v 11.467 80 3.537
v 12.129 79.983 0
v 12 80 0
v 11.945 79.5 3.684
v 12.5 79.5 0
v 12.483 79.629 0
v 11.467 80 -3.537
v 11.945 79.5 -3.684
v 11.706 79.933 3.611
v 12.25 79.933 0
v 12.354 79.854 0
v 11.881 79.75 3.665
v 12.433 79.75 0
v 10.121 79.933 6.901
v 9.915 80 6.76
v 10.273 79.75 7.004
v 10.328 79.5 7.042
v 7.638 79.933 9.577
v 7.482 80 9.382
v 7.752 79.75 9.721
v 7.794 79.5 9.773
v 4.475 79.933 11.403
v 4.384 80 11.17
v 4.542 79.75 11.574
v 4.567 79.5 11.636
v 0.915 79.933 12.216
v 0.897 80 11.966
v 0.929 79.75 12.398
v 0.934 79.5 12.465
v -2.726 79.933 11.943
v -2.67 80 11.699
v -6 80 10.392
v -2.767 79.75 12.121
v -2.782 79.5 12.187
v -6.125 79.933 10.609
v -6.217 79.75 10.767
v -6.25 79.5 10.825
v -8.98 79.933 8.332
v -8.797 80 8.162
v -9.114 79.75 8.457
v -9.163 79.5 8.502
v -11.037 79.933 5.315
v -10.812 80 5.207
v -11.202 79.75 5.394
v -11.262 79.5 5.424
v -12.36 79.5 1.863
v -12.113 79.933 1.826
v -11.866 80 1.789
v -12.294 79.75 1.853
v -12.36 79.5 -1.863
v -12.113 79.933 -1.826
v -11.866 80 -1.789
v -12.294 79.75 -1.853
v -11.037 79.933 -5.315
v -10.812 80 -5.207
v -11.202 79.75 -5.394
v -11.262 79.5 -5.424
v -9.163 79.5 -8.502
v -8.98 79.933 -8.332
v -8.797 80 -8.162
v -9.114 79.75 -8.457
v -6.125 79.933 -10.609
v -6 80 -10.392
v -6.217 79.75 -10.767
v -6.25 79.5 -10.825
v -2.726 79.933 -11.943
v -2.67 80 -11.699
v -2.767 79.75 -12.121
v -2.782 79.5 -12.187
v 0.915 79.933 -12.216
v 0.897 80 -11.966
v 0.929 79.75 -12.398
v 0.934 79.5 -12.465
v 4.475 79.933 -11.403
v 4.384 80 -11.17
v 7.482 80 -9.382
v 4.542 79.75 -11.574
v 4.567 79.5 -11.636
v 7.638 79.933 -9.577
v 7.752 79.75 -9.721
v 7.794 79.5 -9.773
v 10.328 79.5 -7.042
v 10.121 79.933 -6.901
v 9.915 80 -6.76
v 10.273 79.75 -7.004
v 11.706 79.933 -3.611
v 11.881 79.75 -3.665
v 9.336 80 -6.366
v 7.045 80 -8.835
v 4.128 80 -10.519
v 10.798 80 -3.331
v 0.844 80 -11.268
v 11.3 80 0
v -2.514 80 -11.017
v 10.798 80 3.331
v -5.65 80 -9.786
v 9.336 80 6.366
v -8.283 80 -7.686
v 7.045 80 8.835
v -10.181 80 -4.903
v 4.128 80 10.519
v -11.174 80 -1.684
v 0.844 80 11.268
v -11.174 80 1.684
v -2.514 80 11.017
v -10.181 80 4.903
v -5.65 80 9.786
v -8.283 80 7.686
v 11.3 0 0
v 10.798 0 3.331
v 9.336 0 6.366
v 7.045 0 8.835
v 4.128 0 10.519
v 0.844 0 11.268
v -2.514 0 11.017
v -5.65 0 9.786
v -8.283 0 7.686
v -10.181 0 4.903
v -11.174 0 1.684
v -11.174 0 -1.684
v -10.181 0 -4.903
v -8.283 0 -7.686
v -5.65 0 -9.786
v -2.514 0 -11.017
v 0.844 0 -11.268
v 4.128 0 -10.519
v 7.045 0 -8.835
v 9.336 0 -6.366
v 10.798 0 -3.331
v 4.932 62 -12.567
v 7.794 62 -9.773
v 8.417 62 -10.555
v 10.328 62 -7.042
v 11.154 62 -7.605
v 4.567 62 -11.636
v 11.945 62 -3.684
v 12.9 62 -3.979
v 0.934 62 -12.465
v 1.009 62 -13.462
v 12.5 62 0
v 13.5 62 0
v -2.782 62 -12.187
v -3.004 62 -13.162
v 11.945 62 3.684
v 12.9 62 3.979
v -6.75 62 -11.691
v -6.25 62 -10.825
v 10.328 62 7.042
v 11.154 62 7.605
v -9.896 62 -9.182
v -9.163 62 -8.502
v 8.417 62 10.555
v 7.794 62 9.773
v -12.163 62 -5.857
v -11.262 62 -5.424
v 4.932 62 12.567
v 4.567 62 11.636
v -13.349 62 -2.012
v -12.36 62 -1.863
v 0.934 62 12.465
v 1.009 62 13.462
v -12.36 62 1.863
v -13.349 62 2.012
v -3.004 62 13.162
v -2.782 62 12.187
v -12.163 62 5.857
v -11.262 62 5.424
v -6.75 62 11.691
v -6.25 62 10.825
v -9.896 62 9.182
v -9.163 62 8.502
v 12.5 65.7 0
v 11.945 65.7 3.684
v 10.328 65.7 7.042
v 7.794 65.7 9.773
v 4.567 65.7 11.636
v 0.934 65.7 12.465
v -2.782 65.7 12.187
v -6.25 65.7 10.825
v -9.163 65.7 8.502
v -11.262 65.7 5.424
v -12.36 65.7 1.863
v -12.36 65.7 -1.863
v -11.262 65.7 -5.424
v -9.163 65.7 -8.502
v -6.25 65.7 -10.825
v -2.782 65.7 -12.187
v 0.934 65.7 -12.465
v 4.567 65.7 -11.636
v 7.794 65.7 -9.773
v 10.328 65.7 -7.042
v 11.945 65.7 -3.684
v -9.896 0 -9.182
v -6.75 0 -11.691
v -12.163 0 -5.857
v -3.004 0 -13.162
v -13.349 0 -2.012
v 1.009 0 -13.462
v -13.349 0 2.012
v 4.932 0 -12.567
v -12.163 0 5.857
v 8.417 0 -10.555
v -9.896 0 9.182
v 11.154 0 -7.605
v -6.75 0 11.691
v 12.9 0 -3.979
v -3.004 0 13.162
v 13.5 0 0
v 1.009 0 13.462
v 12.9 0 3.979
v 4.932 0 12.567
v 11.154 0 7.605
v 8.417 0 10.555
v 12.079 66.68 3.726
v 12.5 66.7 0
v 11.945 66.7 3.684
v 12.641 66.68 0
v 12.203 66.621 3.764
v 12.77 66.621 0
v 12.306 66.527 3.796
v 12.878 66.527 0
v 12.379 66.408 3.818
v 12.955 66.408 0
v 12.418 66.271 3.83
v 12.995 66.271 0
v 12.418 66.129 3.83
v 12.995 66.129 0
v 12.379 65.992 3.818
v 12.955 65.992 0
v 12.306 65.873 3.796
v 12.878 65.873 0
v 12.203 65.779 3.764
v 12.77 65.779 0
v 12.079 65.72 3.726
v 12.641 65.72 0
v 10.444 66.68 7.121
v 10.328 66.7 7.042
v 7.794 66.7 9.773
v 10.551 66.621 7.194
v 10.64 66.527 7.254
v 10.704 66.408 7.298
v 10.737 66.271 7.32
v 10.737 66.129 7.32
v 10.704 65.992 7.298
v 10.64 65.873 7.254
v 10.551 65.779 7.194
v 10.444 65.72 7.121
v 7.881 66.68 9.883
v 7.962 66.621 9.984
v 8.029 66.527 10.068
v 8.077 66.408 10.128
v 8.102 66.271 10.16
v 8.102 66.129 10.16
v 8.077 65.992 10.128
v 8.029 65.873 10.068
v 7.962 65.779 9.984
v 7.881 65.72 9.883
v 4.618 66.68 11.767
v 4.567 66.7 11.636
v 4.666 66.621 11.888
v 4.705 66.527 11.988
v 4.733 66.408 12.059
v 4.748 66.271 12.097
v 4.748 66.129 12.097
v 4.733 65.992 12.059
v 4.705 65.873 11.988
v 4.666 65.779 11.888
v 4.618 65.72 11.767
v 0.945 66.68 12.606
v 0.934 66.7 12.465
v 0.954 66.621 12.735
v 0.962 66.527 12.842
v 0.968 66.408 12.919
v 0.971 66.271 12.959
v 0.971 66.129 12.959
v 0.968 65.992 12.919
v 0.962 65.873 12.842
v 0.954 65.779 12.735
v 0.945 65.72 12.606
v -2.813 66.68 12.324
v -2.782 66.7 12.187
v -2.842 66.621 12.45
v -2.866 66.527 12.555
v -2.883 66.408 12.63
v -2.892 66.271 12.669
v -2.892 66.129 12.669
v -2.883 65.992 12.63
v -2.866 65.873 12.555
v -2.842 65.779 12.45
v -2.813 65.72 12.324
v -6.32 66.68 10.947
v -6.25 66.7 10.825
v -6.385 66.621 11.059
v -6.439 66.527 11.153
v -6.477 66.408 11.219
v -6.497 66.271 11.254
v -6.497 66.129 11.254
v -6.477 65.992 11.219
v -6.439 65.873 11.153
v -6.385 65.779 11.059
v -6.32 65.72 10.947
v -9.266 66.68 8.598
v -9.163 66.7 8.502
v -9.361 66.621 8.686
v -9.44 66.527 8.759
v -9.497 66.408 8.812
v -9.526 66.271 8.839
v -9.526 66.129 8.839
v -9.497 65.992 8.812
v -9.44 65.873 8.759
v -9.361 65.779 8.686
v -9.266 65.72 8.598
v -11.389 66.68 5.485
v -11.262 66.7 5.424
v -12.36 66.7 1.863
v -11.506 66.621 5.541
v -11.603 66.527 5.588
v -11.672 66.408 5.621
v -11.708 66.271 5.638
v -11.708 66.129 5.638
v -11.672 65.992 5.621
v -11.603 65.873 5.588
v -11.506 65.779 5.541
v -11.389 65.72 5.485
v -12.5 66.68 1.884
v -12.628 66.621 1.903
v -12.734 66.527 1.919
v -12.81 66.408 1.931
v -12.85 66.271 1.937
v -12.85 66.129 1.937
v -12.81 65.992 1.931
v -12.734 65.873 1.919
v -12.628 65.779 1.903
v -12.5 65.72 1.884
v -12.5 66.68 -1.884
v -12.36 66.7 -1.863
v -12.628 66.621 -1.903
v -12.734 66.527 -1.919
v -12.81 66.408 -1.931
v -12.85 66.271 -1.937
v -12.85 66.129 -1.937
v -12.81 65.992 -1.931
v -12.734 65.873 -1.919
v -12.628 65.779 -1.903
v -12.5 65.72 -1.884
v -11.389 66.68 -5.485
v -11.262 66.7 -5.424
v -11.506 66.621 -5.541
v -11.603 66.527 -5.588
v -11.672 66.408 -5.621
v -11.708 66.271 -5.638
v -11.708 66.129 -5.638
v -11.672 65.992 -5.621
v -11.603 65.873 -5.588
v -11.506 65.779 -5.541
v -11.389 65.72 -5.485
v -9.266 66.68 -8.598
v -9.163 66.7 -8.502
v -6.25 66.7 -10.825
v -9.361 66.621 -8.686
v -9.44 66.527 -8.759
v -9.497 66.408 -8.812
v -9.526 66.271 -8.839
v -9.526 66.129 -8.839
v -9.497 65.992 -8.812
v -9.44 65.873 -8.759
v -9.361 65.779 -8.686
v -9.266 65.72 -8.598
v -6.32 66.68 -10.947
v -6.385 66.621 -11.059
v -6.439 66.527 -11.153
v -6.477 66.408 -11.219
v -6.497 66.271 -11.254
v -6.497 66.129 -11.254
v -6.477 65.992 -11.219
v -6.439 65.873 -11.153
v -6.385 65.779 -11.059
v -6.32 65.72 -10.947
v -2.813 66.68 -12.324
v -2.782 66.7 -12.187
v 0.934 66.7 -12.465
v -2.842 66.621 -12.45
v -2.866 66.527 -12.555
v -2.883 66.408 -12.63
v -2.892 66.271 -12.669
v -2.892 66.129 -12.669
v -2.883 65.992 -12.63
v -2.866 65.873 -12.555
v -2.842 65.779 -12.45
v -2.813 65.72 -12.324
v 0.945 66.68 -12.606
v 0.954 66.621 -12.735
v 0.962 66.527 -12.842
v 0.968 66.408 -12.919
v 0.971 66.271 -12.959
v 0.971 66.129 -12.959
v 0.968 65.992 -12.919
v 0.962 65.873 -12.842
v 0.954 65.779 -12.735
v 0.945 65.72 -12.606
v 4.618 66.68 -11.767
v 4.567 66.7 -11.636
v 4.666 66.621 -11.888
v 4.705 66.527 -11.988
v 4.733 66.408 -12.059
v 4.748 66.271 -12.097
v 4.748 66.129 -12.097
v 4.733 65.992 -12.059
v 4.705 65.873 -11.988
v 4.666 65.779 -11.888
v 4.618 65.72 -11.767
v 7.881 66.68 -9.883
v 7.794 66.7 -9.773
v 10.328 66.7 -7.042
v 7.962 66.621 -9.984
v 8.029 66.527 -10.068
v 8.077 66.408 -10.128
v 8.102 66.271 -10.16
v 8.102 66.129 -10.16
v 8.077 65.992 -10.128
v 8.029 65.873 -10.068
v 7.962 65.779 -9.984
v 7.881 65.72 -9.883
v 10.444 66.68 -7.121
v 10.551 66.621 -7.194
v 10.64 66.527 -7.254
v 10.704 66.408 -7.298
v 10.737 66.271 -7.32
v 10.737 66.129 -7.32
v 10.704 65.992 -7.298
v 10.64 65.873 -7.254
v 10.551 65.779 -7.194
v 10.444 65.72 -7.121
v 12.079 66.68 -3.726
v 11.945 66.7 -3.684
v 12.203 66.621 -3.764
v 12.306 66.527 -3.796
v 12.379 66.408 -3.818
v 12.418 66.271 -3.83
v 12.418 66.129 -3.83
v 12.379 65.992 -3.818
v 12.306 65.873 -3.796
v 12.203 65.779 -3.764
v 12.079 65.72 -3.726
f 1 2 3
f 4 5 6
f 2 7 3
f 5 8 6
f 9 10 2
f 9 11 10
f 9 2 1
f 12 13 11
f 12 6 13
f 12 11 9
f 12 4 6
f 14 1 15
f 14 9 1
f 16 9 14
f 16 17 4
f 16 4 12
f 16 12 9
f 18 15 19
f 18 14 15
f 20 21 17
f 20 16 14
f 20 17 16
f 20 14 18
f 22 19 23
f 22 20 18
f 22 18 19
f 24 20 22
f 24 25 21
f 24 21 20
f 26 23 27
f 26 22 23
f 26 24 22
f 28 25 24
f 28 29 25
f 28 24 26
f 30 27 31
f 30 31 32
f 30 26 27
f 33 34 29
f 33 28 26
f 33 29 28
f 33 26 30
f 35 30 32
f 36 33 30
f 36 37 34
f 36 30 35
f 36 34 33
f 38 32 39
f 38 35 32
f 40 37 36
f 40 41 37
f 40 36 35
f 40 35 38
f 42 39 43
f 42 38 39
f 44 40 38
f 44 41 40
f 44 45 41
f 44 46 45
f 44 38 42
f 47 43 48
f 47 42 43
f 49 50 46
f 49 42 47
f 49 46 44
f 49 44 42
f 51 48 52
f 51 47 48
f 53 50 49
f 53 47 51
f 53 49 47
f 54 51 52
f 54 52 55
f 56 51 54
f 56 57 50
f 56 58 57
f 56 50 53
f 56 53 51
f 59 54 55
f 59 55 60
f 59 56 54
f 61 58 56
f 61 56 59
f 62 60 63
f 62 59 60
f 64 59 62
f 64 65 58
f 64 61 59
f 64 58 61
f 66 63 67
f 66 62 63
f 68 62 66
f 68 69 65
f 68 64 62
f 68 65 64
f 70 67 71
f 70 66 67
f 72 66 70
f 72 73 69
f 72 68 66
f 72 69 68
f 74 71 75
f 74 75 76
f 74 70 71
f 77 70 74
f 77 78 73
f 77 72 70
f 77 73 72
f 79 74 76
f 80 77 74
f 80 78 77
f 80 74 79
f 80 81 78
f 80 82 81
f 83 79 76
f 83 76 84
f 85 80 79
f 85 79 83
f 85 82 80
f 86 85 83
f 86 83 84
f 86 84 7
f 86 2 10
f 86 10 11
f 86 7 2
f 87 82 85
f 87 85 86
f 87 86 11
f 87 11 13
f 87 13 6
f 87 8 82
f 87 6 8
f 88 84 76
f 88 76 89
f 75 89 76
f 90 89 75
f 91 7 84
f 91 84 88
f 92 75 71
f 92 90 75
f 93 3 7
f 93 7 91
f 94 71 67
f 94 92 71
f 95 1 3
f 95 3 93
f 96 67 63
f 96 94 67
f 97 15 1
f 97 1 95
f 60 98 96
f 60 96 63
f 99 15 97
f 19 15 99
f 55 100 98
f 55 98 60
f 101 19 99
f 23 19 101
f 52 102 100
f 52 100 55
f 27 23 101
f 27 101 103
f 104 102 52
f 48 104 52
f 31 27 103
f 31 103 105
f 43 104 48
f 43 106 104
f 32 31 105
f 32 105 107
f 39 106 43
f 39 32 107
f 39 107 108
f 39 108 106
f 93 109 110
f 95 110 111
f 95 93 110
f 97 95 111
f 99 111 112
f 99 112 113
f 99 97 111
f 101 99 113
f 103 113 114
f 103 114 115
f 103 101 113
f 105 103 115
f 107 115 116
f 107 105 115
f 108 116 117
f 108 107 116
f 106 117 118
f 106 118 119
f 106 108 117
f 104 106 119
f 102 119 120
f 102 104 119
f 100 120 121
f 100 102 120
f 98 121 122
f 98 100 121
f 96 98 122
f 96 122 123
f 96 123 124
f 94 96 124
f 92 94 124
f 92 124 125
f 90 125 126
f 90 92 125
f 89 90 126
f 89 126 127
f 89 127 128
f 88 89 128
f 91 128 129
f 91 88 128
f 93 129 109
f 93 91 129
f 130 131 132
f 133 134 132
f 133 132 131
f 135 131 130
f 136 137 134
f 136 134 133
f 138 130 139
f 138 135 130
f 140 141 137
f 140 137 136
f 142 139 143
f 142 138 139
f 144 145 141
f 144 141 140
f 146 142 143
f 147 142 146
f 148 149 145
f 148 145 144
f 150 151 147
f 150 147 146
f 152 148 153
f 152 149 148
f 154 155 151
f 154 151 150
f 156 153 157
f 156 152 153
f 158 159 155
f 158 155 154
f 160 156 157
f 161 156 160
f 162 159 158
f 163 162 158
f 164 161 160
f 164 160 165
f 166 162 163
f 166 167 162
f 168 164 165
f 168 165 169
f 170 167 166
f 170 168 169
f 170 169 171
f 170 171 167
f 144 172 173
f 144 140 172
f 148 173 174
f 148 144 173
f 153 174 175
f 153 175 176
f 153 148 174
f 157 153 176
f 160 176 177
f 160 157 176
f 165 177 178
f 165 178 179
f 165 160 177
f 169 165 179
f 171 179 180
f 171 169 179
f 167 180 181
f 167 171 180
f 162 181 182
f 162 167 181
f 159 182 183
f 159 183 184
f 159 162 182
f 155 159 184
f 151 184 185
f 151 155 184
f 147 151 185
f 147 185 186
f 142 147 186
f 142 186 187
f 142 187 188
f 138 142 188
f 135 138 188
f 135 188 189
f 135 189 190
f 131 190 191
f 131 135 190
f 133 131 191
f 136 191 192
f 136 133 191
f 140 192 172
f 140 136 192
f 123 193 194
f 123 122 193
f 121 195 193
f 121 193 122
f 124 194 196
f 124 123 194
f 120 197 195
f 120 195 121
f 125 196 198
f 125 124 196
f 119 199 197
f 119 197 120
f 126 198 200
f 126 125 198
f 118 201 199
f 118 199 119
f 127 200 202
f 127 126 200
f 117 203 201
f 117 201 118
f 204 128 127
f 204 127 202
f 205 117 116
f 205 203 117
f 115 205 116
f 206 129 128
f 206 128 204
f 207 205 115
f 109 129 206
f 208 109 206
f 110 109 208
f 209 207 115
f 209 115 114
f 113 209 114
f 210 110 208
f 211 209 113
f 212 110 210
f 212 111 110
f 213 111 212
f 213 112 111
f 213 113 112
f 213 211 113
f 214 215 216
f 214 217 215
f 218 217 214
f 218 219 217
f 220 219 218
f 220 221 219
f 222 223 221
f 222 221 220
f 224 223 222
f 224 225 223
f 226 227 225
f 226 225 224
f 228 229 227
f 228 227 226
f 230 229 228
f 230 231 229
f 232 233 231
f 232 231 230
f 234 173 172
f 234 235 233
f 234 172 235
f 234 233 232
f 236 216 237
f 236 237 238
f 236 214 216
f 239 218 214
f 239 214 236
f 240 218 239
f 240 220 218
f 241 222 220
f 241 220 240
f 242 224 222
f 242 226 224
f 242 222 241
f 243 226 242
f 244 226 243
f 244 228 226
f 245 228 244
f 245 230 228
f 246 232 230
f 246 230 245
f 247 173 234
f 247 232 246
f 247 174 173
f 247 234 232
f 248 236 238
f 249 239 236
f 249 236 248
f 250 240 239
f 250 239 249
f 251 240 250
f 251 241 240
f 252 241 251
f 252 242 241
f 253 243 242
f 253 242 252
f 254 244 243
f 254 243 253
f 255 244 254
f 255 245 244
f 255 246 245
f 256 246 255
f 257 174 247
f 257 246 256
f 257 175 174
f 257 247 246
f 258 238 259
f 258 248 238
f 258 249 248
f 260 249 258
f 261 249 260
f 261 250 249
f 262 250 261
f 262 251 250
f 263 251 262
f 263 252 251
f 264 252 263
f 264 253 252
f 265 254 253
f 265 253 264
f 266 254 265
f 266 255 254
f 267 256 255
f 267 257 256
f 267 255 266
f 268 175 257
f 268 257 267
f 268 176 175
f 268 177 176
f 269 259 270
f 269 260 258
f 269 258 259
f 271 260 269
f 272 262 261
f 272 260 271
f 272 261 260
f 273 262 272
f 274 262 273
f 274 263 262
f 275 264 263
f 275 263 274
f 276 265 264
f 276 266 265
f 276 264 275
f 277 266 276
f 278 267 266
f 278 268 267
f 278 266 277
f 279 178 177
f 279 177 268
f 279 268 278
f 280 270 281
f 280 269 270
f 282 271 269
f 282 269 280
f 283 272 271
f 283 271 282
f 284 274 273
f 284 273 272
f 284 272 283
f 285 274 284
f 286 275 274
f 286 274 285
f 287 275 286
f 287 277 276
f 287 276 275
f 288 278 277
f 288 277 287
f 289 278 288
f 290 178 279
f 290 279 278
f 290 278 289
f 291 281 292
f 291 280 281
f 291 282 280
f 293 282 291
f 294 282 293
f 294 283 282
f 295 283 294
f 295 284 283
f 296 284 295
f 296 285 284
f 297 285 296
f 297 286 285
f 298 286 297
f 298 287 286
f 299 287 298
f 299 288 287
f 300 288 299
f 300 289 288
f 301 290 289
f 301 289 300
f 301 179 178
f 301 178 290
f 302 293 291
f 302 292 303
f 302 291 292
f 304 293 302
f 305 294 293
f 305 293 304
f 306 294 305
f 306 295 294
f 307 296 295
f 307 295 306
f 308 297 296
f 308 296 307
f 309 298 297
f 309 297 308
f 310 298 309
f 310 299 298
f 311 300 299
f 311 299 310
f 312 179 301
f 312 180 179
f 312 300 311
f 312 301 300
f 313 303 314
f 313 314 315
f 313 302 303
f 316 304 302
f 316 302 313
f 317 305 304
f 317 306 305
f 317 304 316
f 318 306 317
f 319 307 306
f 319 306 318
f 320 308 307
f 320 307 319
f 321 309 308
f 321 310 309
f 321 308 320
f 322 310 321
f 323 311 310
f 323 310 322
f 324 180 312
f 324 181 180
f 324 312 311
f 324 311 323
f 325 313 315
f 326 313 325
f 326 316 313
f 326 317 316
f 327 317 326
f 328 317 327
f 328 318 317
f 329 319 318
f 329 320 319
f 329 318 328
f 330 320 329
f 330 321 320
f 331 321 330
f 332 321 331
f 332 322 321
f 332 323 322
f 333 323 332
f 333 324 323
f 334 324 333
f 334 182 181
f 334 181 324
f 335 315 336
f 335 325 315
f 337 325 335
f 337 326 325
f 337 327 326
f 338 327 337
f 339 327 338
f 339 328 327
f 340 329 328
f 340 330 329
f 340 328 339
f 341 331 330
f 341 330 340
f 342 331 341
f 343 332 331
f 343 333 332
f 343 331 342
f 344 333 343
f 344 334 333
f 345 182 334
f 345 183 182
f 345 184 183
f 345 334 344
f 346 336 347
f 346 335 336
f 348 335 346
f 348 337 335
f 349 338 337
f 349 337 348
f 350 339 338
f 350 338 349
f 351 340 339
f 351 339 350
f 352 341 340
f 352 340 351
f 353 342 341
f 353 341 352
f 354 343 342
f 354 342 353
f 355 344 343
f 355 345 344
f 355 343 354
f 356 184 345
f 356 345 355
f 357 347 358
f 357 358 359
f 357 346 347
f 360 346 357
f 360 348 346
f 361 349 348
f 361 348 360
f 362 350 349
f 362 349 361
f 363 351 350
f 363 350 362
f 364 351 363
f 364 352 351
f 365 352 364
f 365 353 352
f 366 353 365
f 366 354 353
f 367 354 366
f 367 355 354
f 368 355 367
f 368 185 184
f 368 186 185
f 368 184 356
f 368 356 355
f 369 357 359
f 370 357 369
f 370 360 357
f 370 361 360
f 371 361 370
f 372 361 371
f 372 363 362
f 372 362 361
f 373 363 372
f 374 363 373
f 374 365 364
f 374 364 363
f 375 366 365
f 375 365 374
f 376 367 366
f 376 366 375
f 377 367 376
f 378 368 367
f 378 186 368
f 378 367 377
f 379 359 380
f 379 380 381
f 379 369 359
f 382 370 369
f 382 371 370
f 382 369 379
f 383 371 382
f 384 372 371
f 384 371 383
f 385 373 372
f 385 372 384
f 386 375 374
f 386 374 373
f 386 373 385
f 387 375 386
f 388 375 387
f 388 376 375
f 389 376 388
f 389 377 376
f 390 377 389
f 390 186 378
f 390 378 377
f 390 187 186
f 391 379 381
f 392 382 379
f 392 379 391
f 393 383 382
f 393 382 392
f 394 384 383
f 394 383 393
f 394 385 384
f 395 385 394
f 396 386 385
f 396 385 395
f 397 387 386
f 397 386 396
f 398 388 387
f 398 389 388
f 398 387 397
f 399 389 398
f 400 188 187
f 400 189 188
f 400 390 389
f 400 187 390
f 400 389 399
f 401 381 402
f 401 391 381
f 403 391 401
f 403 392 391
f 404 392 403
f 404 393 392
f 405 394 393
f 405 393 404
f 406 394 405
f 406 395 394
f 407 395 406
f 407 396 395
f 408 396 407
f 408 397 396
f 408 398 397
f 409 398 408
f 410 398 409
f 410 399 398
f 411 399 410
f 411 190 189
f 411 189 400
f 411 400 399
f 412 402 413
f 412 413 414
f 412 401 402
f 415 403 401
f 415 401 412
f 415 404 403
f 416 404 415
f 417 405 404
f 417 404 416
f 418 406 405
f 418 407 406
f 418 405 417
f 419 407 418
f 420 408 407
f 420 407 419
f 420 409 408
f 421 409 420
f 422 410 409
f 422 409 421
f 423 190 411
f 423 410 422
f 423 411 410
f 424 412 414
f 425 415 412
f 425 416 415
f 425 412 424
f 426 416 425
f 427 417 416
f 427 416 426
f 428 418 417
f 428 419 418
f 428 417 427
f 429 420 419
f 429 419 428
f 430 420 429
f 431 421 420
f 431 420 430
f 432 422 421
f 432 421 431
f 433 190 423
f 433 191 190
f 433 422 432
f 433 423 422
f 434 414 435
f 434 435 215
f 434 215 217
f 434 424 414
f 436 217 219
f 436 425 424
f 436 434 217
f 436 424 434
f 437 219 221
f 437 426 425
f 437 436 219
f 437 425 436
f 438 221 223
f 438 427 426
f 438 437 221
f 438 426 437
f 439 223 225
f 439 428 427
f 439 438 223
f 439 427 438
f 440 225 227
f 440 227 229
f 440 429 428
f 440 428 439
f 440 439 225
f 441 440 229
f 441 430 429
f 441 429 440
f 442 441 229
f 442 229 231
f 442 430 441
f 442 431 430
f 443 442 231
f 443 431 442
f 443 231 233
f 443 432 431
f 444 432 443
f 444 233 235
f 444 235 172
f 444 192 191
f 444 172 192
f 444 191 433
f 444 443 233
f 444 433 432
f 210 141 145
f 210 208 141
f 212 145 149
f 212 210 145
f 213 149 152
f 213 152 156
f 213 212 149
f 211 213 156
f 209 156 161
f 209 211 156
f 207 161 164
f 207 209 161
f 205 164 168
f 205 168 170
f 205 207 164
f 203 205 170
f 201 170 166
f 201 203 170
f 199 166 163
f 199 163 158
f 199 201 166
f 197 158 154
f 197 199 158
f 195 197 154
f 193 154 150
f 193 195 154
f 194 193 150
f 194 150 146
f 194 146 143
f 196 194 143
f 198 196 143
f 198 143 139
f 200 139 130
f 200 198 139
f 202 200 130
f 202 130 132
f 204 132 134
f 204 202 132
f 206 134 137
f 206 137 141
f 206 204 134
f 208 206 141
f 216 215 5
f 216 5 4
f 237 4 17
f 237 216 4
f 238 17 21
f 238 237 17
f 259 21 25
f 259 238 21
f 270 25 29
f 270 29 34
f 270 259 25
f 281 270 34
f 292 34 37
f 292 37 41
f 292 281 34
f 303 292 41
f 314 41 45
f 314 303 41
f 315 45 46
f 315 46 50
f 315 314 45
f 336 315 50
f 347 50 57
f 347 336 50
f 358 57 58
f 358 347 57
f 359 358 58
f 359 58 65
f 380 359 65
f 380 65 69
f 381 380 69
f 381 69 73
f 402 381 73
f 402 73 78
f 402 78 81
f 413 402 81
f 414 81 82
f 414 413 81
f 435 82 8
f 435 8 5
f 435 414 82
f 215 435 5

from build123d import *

# Parameters (mm, degrees)
FILLET1_R = 0.5


with BuildPart() as part:
    # Sketch1 → Revolve1 (revolve)
    with BuildSketch(Plane.XY):
        with BuildLine():
            Line((11.3, 0), (11.3, 80))
            Line((11.3, 80), (12.5, 80))
            Line((12.5, 80), (12.5, 66.7))
            ThreePointArc((12.5, 66.7), (13, 66.2), (12.5, 65.7))
            Line((12.5, 65.7), (12.5, 62))
            Line((12.5, 62), (13.5, 62))
            Line((13.5, 62), (13.5, 0))
            Line((13.5, 0), (11.3, 0))
        make_face()
    revolve(axis=Axis((0, 52.2625, 0), (0, -1, 0)))

    # Fillet1
    fillet1_edges = [part.edges().sort_by_distance(p)[0] for p in [
        (-12.5, 80, 0),
    ]]
    fillet(fillet1_edges, radius=FILLET1_R)


solid = part.part
